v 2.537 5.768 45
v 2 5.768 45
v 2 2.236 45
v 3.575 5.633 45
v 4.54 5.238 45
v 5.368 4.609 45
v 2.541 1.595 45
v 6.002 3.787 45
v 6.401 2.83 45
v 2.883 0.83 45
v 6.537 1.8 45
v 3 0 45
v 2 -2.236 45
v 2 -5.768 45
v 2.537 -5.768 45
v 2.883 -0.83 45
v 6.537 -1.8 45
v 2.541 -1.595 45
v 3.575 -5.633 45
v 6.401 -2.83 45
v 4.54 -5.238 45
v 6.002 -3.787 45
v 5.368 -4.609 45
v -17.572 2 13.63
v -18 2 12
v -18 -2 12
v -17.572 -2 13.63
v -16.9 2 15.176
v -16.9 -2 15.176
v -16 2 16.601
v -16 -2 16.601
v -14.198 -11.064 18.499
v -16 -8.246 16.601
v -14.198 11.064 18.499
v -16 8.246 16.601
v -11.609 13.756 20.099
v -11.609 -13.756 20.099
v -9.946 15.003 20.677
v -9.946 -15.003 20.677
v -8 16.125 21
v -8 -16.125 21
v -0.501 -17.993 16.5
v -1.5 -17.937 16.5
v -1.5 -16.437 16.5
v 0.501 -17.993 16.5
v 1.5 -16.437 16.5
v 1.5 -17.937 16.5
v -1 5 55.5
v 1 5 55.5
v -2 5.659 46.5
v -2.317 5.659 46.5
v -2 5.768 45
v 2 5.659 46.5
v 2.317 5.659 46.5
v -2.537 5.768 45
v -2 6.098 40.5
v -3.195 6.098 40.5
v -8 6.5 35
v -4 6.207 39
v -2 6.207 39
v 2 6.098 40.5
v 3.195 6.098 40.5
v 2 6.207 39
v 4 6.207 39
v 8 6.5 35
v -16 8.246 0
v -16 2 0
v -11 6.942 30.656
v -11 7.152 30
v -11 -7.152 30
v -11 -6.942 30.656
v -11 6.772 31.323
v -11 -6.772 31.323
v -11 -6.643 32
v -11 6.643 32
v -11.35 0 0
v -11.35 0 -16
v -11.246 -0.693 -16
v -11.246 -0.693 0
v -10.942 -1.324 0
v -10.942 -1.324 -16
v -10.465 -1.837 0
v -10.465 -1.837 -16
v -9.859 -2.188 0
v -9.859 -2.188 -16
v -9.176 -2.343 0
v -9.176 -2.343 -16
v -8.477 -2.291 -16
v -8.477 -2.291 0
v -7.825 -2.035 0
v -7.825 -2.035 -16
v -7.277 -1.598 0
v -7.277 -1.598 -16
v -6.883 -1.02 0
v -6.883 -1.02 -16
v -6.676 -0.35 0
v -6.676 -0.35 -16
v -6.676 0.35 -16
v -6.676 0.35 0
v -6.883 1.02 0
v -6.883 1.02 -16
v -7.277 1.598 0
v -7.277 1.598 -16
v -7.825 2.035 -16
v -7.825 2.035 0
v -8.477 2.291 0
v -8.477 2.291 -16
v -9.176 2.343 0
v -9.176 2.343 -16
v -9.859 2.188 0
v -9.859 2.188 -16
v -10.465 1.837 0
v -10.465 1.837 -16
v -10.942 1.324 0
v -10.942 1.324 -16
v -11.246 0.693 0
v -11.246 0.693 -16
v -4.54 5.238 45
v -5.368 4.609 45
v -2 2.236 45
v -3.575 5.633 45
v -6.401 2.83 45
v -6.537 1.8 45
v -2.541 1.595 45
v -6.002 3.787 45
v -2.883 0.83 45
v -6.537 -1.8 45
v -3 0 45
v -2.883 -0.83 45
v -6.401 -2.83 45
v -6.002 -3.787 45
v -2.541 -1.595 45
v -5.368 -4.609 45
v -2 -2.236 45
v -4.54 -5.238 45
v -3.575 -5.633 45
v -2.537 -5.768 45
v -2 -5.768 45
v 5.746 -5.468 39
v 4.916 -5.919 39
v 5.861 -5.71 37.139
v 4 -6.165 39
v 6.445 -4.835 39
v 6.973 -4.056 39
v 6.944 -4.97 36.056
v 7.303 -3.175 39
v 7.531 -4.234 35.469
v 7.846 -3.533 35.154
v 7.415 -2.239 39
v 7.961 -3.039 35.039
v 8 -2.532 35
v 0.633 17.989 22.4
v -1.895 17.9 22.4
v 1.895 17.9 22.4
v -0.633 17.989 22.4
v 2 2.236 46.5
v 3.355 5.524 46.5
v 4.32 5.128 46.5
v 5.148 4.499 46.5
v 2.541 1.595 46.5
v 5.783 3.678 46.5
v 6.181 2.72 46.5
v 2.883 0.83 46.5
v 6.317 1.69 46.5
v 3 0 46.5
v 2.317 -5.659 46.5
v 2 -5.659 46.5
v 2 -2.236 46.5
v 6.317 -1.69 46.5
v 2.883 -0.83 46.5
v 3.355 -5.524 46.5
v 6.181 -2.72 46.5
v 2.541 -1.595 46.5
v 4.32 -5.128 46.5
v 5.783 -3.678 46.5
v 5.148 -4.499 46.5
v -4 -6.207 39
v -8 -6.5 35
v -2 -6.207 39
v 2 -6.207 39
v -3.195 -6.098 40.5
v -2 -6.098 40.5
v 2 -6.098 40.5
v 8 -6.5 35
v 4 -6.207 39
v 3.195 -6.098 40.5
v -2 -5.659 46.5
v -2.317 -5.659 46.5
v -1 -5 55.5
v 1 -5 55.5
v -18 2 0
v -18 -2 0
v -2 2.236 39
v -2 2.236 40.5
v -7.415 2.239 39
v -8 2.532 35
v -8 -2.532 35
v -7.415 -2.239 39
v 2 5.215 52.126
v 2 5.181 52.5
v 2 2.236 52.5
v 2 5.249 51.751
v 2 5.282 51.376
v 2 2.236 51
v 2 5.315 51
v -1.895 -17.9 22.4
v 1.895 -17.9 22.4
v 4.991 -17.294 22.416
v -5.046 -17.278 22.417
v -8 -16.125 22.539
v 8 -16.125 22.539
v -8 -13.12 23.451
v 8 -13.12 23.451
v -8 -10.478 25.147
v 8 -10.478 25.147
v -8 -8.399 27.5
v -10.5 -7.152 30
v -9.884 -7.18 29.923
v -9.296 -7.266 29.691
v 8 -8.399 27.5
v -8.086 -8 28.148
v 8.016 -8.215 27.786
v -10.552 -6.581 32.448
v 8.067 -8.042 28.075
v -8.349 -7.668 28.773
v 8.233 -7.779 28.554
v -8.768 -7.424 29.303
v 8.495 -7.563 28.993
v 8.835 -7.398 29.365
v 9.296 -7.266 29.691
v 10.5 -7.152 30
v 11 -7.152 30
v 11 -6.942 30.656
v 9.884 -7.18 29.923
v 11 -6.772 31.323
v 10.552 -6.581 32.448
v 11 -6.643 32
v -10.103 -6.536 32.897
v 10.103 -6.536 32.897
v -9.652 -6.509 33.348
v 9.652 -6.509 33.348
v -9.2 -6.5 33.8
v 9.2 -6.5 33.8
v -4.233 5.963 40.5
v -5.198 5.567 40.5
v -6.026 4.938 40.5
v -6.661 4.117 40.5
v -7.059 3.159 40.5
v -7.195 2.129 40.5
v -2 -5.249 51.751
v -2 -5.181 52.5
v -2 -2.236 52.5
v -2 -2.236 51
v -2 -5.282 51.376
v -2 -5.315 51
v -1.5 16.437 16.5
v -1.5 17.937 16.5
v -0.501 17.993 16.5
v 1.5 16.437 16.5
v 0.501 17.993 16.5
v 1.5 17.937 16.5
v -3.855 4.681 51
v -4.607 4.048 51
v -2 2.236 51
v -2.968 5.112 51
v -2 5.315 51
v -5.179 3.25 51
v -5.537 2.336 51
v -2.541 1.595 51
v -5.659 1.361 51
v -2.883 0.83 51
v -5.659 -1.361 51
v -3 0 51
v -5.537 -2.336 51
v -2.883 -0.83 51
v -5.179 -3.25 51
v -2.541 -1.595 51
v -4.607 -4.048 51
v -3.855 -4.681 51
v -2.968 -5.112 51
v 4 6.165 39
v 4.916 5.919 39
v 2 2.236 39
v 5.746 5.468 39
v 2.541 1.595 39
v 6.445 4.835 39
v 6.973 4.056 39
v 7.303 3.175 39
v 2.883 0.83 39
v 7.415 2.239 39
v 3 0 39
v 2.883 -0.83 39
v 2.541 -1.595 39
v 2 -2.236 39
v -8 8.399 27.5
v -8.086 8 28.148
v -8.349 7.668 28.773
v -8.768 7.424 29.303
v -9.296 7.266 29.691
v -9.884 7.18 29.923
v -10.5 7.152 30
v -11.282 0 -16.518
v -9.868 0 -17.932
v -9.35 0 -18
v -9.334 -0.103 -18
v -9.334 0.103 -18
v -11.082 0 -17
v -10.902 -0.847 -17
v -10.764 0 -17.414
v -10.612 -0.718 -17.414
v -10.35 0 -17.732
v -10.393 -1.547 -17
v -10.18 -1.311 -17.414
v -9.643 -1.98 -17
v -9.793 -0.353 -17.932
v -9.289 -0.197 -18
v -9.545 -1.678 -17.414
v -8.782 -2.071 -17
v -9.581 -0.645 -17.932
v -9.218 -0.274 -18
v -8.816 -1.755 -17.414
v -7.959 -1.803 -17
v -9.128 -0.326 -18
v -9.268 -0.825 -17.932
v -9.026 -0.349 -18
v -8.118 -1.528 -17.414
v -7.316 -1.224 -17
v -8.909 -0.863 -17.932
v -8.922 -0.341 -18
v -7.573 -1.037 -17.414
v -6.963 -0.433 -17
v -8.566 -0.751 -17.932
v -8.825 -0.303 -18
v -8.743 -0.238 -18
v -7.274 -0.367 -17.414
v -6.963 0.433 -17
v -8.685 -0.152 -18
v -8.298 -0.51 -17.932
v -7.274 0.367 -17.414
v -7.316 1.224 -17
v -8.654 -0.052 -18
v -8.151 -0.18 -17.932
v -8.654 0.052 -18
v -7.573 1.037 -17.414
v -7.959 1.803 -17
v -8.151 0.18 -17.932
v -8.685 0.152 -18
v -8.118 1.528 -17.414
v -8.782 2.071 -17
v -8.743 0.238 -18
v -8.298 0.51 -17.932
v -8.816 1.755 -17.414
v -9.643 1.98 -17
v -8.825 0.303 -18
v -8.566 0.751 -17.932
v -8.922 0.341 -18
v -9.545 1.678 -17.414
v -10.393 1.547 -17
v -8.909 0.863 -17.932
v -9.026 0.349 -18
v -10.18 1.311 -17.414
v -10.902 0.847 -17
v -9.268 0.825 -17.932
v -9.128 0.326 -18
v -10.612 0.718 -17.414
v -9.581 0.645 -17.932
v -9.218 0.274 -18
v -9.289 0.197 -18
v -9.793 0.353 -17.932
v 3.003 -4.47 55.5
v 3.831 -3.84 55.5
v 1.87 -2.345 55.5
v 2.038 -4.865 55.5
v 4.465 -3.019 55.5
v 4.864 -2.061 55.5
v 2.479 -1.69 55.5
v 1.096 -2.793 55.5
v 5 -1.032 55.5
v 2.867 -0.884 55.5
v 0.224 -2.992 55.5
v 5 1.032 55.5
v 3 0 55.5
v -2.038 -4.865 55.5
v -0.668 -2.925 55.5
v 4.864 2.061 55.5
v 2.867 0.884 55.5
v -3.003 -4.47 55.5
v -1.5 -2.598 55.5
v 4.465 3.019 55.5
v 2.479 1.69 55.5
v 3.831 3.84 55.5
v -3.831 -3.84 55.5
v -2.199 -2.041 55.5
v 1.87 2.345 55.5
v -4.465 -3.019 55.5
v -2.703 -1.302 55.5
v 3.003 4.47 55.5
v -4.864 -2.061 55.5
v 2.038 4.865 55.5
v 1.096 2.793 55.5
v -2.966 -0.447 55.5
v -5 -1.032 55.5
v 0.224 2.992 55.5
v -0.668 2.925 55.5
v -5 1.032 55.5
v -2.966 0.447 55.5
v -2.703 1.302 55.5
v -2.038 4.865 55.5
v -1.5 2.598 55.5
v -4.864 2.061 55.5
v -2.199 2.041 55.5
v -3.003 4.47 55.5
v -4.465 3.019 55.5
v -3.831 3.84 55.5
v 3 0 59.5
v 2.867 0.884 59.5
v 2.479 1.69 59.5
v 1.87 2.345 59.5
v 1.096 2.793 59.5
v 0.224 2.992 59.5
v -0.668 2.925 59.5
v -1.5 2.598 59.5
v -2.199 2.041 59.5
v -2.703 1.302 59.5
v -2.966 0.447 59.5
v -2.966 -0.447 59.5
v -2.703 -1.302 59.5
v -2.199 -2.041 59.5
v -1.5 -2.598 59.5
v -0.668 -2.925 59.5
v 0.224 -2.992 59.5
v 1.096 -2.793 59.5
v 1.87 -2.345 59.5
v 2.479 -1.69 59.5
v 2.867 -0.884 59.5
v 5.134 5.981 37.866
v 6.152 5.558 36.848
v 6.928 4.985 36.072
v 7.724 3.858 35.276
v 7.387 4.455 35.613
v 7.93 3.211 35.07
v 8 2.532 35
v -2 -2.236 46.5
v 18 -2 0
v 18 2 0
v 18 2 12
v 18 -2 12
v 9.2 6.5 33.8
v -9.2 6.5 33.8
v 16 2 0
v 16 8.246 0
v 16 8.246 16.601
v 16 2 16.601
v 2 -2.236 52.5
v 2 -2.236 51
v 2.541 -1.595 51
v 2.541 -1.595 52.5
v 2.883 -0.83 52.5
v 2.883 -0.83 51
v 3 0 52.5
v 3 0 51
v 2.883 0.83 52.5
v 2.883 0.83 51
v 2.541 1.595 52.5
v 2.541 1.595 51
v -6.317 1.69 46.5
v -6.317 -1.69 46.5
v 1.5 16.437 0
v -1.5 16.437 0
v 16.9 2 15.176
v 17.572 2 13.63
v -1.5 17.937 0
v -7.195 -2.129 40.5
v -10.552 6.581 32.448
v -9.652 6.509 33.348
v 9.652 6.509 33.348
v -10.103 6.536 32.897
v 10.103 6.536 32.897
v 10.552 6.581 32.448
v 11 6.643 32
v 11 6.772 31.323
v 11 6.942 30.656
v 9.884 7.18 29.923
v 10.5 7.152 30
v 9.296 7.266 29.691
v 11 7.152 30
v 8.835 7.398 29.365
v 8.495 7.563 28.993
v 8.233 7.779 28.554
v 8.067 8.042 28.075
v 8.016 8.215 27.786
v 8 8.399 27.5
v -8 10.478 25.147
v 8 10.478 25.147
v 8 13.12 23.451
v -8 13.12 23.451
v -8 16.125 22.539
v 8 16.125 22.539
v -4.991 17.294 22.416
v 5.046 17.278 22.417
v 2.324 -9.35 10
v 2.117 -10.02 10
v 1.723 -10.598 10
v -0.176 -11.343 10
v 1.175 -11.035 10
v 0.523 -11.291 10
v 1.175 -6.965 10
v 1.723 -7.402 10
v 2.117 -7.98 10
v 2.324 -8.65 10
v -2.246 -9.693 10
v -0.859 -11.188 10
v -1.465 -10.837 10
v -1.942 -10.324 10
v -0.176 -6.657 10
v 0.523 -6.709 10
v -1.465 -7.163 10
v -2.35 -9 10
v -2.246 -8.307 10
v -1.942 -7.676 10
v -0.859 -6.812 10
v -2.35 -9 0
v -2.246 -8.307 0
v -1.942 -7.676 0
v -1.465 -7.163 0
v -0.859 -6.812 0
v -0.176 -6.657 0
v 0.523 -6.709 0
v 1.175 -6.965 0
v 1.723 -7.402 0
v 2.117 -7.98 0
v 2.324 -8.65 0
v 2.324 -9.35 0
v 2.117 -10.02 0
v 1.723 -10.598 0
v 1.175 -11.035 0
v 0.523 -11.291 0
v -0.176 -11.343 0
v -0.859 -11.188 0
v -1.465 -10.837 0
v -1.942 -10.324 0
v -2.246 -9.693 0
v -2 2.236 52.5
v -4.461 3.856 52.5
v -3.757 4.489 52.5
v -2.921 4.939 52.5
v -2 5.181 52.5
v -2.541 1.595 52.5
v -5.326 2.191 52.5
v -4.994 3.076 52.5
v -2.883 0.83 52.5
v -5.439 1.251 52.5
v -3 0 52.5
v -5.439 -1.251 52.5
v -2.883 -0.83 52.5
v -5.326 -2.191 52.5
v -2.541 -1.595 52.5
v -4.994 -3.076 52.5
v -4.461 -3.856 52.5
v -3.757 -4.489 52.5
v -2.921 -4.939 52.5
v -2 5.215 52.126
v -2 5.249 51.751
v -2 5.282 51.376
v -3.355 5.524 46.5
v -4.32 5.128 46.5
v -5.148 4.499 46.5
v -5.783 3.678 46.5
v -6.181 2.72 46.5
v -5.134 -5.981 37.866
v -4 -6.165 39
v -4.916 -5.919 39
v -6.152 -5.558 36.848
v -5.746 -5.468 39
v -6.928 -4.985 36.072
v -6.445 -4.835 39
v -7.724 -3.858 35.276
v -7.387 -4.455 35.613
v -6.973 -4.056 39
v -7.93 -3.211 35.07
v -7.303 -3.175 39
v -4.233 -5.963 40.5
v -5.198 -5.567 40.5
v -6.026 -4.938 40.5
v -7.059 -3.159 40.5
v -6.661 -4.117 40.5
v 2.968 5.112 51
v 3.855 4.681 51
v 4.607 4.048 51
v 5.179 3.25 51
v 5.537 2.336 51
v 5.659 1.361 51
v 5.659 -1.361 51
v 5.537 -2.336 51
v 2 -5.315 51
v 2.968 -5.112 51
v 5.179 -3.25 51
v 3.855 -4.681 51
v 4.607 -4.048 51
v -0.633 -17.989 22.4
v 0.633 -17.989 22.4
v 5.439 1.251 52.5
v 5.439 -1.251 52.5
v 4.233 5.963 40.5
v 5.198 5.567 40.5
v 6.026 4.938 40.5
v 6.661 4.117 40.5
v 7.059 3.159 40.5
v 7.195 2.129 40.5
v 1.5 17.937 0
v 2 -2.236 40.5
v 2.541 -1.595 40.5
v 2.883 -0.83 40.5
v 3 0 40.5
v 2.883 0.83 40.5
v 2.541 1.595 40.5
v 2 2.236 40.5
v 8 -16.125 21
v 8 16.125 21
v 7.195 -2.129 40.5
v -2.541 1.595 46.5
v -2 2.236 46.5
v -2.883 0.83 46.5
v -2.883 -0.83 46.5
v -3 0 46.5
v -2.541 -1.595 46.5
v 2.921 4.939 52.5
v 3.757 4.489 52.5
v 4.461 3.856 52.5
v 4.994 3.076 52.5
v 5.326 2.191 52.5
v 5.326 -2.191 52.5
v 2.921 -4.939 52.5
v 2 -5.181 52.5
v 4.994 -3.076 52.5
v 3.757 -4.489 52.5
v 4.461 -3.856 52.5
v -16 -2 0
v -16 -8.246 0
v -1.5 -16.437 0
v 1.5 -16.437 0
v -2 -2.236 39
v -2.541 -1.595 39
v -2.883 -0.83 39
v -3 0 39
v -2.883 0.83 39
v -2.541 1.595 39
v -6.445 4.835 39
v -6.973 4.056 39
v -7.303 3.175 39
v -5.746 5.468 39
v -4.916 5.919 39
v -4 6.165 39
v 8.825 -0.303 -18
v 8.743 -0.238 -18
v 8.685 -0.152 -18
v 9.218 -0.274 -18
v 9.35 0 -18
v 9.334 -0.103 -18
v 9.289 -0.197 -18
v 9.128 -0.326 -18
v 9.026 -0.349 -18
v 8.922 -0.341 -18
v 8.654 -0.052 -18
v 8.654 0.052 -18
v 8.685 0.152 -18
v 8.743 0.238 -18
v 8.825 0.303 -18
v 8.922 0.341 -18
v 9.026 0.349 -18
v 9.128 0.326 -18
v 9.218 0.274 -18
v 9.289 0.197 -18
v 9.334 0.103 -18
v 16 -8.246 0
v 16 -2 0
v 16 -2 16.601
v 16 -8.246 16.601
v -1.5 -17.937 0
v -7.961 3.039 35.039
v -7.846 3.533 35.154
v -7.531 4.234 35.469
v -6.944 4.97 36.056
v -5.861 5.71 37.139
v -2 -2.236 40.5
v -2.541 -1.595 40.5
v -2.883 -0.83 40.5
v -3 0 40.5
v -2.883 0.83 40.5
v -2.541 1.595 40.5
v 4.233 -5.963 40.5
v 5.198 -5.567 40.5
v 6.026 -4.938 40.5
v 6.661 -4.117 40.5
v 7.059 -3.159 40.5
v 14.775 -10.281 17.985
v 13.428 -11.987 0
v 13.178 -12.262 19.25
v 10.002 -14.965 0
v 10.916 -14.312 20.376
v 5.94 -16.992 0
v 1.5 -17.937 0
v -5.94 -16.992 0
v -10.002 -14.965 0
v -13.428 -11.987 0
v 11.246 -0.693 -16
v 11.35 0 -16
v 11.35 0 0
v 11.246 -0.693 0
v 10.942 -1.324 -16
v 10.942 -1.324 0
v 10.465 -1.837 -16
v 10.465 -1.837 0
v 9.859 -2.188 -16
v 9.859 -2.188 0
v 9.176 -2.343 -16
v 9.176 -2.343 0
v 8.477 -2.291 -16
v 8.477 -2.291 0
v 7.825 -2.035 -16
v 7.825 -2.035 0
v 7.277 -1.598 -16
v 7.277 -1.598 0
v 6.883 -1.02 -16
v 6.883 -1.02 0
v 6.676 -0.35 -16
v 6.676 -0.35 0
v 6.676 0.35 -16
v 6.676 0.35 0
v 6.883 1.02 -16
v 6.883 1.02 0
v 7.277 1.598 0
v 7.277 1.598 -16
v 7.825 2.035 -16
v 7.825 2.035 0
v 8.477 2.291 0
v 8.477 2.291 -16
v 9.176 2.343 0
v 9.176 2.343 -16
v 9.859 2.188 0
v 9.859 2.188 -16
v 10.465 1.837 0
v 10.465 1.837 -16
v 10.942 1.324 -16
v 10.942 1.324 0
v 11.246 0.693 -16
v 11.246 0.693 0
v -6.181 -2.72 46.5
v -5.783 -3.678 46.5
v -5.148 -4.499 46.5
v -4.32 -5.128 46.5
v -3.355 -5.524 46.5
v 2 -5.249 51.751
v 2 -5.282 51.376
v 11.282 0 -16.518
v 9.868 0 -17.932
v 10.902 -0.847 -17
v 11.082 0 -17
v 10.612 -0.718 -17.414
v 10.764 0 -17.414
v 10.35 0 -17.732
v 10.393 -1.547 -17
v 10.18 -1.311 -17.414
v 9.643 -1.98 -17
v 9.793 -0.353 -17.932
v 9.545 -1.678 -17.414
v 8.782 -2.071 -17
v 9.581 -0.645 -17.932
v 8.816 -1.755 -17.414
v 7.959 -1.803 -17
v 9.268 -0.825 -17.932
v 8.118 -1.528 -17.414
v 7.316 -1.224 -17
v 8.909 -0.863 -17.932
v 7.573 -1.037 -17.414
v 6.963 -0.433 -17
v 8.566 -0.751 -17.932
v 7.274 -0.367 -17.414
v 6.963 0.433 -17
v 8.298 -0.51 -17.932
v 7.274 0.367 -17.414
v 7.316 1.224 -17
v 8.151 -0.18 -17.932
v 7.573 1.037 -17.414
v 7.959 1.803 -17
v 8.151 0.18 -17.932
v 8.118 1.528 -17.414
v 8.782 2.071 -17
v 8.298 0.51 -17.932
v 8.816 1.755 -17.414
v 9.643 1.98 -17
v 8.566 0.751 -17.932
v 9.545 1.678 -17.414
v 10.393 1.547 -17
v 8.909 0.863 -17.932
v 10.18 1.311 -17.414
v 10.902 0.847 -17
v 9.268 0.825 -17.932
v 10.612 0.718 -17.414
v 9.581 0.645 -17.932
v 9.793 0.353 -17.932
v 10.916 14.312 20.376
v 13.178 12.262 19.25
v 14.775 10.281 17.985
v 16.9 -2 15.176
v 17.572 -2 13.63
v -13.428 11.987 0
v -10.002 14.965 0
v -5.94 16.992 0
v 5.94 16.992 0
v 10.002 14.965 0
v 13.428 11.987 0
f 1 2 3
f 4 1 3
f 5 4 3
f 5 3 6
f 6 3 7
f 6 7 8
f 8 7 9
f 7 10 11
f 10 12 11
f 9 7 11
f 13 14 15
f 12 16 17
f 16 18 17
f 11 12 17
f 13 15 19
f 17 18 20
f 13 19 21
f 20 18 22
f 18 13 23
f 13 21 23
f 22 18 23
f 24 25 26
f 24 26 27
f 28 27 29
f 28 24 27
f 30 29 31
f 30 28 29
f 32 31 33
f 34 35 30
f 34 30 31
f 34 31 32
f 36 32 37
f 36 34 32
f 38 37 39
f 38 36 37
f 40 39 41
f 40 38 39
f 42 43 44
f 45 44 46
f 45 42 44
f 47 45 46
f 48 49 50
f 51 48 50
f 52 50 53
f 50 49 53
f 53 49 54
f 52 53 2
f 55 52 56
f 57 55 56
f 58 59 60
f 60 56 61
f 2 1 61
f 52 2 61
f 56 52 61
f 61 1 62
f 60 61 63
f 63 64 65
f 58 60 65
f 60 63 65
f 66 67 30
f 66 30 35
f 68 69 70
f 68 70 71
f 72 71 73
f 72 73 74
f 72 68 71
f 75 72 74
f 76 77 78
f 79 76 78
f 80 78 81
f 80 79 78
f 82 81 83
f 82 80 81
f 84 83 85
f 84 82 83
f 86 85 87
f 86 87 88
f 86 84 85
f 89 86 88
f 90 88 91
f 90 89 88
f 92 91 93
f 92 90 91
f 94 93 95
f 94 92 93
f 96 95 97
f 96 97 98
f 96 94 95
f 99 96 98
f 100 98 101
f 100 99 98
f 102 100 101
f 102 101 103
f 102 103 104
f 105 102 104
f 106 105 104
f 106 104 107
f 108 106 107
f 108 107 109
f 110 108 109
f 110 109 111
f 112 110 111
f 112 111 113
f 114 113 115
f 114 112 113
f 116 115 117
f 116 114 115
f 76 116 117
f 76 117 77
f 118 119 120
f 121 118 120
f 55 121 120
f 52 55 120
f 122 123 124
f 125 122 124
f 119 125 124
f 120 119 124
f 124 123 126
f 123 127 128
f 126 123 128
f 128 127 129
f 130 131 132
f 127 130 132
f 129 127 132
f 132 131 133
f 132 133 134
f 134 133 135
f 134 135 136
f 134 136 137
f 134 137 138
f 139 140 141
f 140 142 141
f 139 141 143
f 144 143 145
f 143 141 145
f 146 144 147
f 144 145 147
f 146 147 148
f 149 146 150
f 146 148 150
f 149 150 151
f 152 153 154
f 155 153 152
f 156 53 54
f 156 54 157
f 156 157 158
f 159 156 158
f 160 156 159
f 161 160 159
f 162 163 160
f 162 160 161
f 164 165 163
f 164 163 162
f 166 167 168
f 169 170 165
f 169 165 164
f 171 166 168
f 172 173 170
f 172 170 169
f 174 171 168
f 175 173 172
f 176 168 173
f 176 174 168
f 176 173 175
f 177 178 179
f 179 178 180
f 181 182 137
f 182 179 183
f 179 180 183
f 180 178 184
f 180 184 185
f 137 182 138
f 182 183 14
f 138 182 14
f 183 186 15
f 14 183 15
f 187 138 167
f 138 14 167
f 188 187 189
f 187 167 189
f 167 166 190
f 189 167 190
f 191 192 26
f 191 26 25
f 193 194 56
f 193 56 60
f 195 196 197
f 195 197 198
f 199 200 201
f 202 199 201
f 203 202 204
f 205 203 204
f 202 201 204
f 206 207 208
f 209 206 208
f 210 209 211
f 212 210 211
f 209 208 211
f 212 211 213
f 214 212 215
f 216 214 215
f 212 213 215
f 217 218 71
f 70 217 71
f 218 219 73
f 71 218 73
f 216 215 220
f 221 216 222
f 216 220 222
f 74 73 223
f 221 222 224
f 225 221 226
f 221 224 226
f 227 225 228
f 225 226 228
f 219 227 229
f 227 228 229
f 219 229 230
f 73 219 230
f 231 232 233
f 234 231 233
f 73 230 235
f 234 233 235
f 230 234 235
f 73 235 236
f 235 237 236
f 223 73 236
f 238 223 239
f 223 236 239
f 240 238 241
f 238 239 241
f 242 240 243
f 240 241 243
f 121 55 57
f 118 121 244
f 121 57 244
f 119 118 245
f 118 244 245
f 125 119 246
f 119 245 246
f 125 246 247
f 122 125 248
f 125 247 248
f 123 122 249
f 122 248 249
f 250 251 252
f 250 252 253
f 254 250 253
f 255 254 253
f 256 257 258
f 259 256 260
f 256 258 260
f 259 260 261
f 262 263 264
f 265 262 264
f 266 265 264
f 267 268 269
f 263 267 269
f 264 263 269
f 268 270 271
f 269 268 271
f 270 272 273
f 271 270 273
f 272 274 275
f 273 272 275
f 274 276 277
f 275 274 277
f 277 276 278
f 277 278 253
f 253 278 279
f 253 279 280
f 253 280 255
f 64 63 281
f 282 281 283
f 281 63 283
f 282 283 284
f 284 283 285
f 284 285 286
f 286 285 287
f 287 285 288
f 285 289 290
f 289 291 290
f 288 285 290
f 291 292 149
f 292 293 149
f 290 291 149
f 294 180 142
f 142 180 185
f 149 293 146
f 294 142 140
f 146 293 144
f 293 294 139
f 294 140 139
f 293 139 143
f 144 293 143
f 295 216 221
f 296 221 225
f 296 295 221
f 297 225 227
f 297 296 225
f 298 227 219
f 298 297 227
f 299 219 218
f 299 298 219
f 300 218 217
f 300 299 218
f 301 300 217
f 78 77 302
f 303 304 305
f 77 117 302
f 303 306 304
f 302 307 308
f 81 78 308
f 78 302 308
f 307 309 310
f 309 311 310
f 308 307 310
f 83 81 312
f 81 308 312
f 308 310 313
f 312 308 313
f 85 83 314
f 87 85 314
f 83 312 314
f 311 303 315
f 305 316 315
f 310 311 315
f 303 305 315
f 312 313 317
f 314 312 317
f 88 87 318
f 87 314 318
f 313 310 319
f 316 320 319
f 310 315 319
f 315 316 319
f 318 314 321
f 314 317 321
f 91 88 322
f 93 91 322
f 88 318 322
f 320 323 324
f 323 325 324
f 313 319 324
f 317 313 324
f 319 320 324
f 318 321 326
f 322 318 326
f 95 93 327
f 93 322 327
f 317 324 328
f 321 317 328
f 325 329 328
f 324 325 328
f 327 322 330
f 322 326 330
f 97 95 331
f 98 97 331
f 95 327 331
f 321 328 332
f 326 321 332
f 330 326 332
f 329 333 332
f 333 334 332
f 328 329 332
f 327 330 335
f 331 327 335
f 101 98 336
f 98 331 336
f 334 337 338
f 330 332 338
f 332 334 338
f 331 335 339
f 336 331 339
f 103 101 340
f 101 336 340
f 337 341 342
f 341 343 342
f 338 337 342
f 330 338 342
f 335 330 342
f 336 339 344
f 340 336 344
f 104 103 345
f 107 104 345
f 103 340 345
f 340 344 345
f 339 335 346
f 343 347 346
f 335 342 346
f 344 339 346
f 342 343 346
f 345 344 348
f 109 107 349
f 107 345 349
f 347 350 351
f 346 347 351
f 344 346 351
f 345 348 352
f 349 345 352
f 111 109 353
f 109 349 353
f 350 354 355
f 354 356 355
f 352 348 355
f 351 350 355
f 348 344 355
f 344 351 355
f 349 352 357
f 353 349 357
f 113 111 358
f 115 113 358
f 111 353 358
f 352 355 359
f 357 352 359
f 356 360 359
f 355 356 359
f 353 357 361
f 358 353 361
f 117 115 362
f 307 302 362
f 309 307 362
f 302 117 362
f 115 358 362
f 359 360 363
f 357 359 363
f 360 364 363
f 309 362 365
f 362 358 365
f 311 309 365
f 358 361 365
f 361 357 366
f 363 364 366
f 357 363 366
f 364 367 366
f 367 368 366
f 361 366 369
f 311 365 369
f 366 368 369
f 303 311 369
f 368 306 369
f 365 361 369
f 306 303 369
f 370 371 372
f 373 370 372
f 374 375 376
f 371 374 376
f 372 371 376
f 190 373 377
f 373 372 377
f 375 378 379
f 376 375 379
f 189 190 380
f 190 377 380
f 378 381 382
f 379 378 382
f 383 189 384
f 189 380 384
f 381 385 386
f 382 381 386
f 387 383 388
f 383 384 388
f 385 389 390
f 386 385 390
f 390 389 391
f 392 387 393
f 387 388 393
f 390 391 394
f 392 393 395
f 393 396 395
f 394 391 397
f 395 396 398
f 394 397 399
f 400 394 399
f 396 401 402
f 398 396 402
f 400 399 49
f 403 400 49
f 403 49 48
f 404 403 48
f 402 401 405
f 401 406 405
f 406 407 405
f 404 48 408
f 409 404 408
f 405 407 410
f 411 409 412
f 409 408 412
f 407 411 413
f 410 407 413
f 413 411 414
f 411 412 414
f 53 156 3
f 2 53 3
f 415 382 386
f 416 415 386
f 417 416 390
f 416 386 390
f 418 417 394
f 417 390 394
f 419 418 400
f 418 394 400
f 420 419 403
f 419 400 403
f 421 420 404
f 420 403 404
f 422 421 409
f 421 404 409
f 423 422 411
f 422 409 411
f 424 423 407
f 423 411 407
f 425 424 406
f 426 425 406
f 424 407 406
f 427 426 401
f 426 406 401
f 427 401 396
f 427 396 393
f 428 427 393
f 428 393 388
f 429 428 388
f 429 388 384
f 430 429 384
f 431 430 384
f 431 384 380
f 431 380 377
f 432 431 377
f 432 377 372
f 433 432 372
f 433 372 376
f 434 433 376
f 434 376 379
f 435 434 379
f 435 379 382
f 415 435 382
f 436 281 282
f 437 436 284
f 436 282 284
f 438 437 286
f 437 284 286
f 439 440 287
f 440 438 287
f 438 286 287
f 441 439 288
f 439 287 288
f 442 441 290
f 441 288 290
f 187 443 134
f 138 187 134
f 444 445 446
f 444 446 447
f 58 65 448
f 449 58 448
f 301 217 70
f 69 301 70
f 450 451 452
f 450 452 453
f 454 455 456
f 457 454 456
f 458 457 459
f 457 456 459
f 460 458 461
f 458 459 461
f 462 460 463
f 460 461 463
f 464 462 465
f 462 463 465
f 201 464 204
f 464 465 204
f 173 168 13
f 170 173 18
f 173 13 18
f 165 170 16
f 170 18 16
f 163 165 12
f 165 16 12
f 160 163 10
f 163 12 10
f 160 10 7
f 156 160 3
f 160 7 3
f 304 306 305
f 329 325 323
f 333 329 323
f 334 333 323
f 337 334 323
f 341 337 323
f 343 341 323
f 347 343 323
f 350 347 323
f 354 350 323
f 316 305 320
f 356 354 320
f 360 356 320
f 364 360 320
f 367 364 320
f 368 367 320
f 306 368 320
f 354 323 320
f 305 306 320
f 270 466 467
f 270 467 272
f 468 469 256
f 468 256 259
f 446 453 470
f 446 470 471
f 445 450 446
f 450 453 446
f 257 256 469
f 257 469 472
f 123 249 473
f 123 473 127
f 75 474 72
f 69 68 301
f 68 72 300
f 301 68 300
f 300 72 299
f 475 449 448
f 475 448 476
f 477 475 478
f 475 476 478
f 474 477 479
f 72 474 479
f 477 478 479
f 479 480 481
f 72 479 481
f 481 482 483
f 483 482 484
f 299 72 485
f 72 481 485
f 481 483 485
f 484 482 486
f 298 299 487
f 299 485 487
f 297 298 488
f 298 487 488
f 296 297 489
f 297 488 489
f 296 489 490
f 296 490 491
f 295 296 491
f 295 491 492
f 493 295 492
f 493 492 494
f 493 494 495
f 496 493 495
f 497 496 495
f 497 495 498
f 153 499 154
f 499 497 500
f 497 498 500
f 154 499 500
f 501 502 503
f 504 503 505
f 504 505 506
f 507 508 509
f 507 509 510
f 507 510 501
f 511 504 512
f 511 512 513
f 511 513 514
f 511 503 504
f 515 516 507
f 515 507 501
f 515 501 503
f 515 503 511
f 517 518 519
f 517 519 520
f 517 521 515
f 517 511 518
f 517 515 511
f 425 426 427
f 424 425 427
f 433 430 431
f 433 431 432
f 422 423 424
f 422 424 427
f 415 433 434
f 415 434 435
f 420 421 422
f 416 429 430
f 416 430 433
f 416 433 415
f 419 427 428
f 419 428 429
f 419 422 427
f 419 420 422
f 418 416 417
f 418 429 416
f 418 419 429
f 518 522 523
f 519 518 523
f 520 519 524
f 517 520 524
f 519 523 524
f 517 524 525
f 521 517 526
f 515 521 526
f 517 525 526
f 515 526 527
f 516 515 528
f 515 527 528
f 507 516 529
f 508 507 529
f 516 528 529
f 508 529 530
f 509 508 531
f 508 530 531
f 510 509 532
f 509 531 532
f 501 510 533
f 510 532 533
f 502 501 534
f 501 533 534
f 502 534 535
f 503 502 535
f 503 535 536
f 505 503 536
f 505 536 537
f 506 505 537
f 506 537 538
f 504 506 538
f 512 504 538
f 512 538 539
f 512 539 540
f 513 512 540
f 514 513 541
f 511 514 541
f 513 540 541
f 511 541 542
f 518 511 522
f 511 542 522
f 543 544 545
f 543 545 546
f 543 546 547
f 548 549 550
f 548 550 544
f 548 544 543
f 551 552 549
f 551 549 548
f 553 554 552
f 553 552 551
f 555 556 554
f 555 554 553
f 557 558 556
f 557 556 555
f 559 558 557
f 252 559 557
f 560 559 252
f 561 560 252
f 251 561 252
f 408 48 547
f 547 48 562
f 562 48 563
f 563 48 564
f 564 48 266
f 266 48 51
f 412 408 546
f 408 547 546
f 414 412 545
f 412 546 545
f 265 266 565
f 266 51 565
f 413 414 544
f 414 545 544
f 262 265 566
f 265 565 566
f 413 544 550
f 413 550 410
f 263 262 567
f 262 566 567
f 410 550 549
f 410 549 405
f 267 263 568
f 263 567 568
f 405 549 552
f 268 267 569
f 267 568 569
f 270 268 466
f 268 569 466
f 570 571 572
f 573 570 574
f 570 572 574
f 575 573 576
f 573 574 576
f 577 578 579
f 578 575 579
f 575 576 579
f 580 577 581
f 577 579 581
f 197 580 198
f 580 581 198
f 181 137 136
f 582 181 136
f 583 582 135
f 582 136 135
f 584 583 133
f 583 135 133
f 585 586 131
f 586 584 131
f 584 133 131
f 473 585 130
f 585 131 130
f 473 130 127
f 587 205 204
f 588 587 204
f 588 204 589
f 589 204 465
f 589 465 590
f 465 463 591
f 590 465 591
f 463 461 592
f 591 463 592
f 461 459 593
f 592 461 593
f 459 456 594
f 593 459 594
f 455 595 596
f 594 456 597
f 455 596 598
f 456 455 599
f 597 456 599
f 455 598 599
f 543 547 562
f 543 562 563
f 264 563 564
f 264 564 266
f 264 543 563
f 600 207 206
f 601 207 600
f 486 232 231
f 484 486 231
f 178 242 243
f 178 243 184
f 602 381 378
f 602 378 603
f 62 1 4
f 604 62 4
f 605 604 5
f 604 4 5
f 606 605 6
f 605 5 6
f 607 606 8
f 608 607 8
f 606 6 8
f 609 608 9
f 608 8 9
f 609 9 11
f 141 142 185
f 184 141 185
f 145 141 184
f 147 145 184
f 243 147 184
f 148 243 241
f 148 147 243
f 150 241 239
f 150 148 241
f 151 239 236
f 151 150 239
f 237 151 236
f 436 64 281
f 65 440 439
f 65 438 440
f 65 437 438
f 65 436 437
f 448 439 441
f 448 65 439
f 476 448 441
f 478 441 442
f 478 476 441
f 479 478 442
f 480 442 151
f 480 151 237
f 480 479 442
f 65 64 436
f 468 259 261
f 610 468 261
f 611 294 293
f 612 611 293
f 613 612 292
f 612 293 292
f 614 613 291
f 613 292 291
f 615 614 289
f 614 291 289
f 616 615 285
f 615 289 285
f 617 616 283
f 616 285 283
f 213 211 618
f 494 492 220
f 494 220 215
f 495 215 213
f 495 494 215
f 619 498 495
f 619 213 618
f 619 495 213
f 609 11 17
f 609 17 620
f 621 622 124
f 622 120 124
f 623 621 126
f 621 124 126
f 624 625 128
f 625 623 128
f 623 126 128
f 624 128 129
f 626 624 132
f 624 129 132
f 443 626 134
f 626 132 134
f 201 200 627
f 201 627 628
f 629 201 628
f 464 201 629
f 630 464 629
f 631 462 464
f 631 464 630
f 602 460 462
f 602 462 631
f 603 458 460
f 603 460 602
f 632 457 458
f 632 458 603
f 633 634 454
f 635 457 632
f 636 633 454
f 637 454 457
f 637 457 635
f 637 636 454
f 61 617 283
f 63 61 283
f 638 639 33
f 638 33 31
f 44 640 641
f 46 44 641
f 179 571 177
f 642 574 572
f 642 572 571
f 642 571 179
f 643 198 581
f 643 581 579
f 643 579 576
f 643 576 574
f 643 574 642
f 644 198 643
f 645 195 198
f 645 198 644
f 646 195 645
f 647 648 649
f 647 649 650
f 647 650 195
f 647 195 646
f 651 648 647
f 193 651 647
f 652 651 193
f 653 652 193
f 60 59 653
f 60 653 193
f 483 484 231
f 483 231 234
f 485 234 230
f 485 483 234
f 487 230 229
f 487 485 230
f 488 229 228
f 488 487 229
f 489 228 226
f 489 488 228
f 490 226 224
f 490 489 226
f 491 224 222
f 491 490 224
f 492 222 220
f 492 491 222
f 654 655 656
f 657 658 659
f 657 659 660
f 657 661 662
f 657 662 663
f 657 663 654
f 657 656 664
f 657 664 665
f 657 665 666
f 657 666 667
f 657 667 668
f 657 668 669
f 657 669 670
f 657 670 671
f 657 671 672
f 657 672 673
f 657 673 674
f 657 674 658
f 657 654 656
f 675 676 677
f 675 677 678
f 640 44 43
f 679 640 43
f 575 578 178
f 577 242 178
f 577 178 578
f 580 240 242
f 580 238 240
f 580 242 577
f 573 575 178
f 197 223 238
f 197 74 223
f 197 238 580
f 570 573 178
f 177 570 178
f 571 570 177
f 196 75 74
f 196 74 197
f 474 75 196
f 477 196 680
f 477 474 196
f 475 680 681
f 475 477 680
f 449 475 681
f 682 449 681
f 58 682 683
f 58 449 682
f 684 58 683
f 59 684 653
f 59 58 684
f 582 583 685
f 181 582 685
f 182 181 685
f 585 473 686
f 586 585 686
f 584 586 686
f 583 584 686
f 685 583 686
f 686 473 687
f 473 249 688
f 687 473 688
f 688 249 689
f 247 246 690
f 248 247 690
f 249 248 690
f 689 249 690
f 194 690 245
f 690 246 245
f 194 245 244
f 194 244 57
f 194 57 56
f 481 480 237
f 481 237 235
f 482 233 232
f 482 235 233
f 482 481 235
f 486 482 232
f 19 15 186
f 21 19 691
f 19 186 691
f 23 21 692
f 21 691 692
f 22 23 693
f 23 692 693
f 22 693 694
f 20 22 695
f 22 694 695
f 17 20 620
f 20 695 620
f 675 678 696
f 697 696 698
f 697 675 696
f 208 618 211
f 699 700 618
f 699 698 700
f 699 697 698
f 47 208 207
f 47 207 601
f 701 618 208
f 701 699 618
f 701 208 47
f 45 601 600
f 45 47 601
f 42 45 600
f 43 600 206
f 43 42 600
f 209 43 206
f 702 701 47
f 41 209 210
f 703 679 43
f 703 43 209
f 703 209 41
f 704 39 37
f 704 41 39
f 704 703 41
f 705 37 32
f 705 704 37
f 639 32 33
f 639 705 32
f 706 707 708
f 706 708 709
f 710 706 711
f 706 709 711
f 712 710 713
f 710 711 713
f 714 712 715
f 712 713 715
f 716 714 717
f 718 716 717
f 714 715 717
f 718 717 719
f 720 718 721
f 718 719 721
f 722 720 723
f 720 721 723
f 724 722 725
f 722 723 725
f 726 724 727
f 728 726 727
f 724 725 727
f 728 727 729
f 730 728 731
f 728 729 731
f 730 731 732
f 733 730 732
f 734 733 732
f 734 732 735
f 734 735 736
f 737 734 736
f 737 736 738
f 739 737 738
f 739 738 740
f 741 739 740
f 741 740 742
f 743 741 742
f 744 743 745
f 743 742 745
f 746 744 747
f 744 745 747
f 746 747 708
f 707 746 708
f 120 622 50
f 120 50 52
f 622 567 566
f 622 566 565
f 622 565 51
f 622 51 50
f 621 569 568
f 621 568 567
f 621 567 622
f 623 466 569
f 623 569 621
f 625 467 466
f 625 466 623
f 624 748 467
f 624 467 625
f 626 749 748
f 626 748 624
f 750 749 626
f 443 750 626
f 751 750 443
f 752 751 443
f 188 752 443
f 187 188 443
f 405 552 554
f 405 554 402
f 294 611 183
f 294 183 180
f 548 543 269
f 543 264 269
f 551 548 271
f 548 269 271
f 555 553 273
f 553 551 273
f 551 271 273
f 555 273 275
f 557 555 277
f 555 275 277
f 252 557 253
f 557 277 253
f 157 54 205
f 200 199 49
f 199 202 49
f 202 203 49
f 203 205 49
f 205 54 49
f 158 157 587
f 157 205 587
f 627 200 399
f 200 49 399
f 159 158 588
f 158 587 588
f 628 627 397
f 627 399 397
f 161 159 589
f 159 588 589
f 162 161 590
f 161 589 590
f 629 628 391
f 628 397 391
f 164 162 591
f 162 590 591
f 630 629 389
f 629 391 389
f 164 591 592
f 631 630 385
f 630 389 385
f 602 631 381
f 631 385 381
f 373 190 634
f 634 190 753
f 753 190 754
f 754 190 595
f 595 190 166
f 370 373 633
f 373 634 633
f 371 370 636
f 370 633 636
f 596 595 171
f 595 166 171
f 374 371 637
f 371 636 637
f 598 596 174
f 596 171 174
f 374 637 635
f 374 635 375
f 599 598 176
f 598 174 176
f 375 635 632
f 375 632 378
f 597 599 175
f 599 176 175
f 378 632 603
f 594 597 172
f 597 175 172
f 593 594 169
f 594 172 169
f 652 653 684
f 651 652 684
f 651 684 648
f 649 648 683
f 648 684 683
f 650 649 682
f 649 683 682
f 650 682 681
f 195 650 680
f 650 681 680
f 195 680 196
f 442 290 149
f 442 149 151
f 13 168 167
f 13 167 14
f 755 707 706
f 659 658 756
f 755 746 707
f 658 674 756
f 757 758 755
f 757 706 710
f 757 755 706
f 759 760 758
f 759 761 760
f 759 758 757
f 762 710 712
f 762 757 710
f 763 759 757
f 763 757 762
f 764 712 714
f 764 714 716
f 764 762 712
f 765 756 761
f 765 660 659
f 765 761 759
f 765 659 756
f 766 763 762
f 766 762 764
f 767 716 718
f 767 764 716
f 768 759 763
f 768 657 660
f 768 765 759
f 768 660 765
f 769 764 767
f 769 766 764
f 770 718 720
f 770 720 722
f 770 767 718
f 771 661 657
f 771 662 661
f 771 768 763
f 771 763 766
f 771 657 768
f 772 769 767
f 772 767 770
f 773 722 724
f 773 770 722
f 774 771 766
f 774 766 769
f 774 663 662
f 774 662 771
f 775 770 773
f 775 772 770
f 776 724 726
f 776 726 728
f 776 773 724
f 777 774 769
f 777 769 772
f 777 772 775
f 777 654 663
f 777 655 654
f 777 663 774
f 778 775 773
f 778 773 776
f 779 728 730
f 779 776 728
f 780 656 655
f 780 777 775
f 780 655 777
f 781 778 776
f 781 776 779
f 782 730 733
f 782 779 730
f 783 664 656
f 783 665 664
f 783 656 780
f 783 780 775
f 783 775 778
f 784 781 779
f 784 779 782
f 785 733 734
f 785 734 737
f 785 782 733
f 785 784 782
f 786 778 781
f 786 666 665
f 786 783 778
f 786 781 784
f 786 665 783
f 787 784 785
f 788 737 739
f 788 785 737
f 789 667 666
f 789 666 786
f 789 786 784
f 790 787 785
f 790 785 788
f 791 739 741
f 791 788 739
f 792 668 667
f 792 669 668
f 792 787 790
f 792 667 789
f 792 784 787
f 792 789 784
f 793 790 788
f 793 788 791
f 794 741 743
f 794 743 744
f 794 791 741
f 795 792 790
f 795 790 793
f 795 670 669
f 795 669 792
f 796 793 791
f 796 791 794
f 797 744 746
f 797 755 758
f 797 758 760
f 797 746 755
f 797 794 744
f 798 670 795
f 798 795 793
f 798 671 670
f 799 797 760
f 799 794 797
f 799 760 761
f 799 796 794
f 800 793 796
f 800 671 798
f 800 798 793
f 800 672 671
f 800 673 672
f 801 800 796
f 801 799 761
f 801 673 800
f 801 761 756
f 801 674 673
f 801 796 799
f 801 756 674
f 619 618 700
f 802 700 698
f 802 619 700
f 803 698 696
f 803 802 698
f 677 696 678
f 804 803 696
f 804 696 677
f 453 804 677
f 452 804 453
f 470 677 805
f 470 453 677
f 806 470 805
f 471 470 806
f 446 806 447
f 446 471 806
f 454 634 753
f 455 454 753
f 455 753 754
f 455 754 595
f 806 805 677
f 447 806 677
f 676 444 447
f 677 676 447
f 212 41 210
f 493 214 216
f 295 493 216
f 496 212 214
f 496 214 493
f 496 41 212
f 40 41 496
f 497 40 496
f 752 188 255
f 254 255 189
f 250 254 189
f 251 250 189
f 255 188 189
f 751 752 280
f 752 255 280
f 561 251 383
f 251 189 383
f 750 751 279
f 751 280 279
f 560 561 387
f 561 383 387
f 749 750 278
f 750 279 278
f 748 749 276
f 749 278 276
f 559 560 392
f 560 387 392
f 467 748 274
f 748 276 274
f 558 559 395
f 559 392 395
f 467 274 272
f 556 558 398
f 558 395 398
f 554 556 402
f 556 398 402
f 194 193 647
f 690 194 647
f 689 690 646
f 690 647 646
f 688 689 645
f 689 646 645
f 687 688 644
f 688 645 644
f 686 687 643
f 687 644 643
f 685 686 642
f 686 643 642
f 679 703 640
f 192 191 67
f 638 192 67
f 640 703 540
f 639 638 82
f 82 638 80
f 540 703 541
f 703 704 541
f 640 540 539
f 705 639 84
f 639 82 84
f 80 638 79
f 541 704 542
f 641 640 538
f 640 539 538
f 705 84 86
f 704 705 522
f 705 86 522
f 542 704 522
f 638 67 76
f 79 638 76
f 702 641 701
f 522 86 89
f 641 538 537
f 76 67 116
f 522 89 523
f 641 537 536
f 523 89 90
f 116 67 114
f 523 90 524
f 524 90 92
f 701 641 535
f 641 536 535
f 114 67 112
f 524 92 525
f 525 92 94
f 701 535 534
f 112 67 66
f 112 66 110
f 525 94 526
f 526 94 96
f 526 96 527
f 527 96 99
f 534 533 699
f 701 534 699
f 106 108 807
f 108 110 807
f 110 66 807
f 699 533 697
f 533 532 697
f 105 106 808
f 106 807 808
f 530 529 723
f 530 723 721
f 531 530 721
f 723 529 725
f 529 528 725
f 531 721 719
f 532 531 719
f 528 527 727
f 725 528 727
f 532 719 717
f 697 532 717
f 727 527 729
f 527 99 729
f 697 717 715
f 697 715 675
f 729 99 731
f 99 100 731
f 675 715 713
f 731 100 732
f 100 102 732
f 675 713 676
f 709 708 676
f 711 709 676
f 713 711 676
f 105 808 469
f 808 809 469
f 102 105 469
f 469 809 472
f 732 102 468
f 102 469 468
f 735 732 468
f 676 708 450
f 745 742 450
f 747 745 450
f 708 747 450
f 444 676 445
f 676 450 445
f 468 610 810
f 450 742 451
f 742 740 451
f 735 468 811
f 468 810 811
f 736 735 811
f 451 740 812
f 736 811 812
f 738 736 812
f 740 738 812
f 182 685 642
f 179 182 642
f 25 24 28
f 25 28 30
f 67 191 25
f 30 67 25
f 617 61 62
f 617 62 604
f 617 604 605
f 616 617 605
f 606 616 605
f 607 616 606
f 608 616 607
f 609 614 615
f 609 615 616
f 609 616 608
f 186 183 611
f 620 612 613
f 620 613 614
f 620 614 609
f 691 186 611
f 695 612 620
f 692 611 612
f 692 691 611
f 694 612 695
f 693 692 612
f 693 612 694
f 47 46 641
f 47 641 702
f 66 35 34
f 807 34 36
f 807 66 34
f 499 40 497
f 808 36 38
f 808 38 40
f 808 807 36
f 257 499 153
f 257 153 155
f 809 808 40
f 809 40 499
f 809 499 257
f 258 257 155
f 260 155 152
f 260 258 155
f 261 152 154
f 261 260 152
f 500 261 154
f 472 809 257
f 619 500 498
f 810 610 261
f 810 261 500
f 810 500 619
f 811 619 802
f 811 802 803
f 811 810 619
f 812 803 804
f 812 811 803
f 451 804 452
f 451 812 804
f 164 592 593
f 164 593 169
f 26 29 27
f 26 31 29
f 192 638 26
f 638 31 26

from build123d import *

# Parameters (mm, degrees)
BOSS_EXTRUDE1_DEPTH  = 55.5
SKETCH4_OUTSIDE_W    = 53.062
SKETCH4_OUTSIDE_H    = 72.562
CUT_EXTRUDE3_DEPTH   = 20
CUT_EXTRUDE4_DEPTH   = 16.5
SKETCH6_R            = 5
BOSS_EXTRUDE3_DEPTH  = 55.5
SKETCH7_OUTSIDE_W    = 72.562
SKETCH7_OUTSIDE_H    = 53.062
CUT_EXTRUDE6_DEPTH   = 27.75
FILLET3_R            = 4
SKETCH8_R            = 2.35
BOSS_EXTRUDE4_DEPTH  = 18
FILLET4_R            = 2
FILLET4_OF_MIRROR2_R = 2
SKETCH10_W           = 8.464758564
SKETCH10_H           = 1.5
CUT_EXTRUDE8_DEPTH   = 12
SKETCH11_R           = 3
BOSS_EXTRUDE6_DEPTH  = 59.5
SKETCH12_R           = 2.35
CUT_EXTRUDE9_DEPTH   = 10


with BuildPart() as part:
    # Sketch1 → Boss-Extrude1 (new body)
    with BuildSketch(Plane.XY):
        with BuildLine():
            Line((-16, 2), (-16, 8.246211251))
            ThreePointArc((-16, 8.246211251), (0, 18), (16, 8.246211251))
            Line((16, 8.246211251), (16, 2))
            Line((16, 2), (18, 2))
            Line((18, 2), (18, -2))
            Line((18, -2), (16, -2))
            Line((16, -2), (16, -8.246211251))
            ThreePointArc((16, -8.246211251), (0, -18), (-16, -8.246211251))
            Line((-16, -8.246211251), (-16, -2))
            Line((-16, -2), (-18, -2))
            Line((-18, -2), (-18, 2))
            Line((-18, 2), (-16, 2))
        make_face()
    extrude(amount=BOSS_EXTRUDE1_DEPTH)

    # Sketch4 outside → Cut-Extrude3 (cut, symmetric)
    with BuildSketch(Plane(origin=(0, 0, 0), x_dir=(1, 0, 0), z_dir=(0, 1, 0))):
        with Locations((0, -27.75)):
            Rectangle(SKETCH4_OUTSIDE_W, SKETCH4_OUTSIDE_H)
        with BuildLine():
            Line((-18, 0), (-18, -12))
            ThreePointArc((-18, -12), (-14.536312565, -18.207013961), (-8, -21))
            Line((-8, -21), (-8, -27.5))
            ThreePointArc((-8, -27.5), (-8.732233047, -29.267766953), (-10.5, -30))
            Line((-10.5, -30), (-11, -30))
            Line((-11, -30), (-11, -32))
            Line((-11, -32), (-8, -35))
            Line((-8, -35), (-5, -55.5))
            Line((-5, -55.5), (5, -55.5))
            Line((5, -55.5), (8, -35))
            Line((8, -35), (11, -32))
            Line((11, -32), (11, -30))
            Line((11, -30), (10.5, -30))
            ThreePointArc((10.5, -30), (8.732233047, -29.267766953), (8, -27.5))
            Line((8, -27.5), (8, -21))
            ThreePointArc((8, -21), (14.536312565, -18.207013961), (18, -12))
            Line((18, -12), (18, 0))
            Line((18, 0), (-18, 0))
        make_face(mode=Mode.SUBTRACT)
    extrude(amount=CUT_EXTRUDE3_DEPTH, both=True, mode=Mode.SUBTRACT)

    # Sketch5 → Cut-Extrude4 (cut)
    with BuildSketch(Plane(origin=(0, 0, 0), x_dir=(-1, 0, 0), z_dir=(0, 0, -1))):
        Polygon((0, 19.680001022), (1.5, 19.680001022), (1.5, 17.937391115), (1.5, 16.437391115), (-1.5, 16.437391115), (-1.5, 19.680001022), align=None)
    cut_extrude4 = extrude(amount=-CUT_EXTRUDE4_DEPTH, mode=Mode.SUBTRACT)

    # Mirror1: Cut-Extrude4 across plane
    add(cut_extrude4.mirror(Plane.ZX), mode=Mode.SUBTRACT)

    # Sketch6 → Boss-Extrude3 (add)
    with BuildSketch(Plane.XY):
        Circle(SKETCH6_R)
    extrude(amount=BOSS_EXTRUDE3_DEPTH)

    # Sketch7 outside → Cut-Extrude6 (cut, symmetric)
    with BuildSketch(Plane(origin=(0, 0, 0), x_dir=(0, 0, -1), z_dir=(1, 0, 0))):
        with Locations((-27.75, 0)):
            Rectangle(SKETCH7_OUTSIDE_W, SKETCH7_OUTSIDE_H)
        with BuildLine():
            Line((-22.4, 17.937391115), (-22.4, 20.910001086))
            Line((-22.4, 20.910001086), (0, 20.910001086))
            Line((0, 20.910001086), (0, 17.937391115))
            Line((0, 17.937391115), (0, -17.937391115))
            Line((0, -17.937391115), (0, -20.333967998))
            Line((0, -20.333967998), (-22.4, -20.333967998))
            Line((-22.4, -20.333967998), (-22.4, -17.9))
            ThreePointArc((-22.4, -17.9), (-25.738982694, -9.838982694), (-33.8, -6.5))
            Line((-33.8, -6.5), (-35, -6.5))
            Line((-35, -6.5), (-55.5, -5))
            Line((-55.5, -5), (-55.5, 5))
            Line((-55.5, 5), (-35, 6.5))
            Line((-35, 6.5), (-33.8, 6.5))
            ThreePointArc((-33.8, 6.5), (-25.738982694, 9.838982694), (-22.4, 17.9))
            Line((-22.4, 17.9), (-22.4, 17.937391115))
        make_face(mode=Mode.SUBTRACT)
    extrude(amount=CUT_EXTRUDE6_DEPTH, both=True, mode=Mode.SUBTRACT)

    # Fillet3
    # the kernel refuses this fillet: 4 mm, written as the material it takes off along each edge
    with BuildSketch(Plane(origin=(3.570969245, 4.285484623, 65.26504349), x_dir=(0.010456033399530511, -0.9973894081641158, -0.0714495615632633), z_dir=(0.14442116856011564, 0.07221058427983153, -0.9868779851580924))) as fillet3_piece_1_section:
        with BuildLine():
            CenterArc((FILLET3_R * 0.989488430862, FILLET3_R), FILLET3_R, 180.605445032, 89.394554968)
            Line((-FILLET3_R * 0.0104557388149, FILLET3_R * 0.989433187404), (0, 0))
            Line((0, 0), (FILLET3_R * 0.989488430862, 0))
        make_face()
    fillet3_piece_1 = extrude(amount=40.562346695, mode=Mode.PRIVATE)
    fillet3_piece_1 = split(fillet3_piece_1, bisect_by=Plane(origin=(-1.347793771, 4.447005001, 44.347793771), z_dir=(0.7071067811865519, 0, 0.7071067811865431)), keep=Keep.TOP, mode=Mode.PRIVATE)
    add(fillet3_piece_1, mode=Mode.SUBTRACT)
    with BuildSketch(Plane(origin=(9.429030755, -7.214515377, 25.23495651), x_dir=(0.01045603339953013, 0.9973894081641159, -0.07144956156326311), z_dir=(-0.14442116856011564, 0.07221058427983126, 0.9868779851580924))) as fillet3_piece_2_section:
        with BuildLine():
            CenterArc((FILLET3_R * 0.989488430862, FILLET3_R), FILLET3_R, 180.605445032, 89.394554968)
            Line((-FILLET3_R * 0.0104557388149, FILLET3_R * 0.989433187404), (0, 0))
            Line((0, 0), (FILLET3_R * 0.989488430862, 0))
        make_face()
    fillet3_piece_2 = extrude(amount=40.562346695, mode=Mode.PRIVATE)
    fillet3_piece_2 = split(fillet3_piece_2, bisect_by=Plane(origin=(-1.347793771, -4.447005001, 44.347793771), z_dir=(0.7071067811865519, 0, 0.7071067811865431)), keep=Keep.TOP, mode=Mode.PRIVATE)
    add(fillet3_piece_2, mode=Mode.SUBTRACT)
    with BuildSketch(Plane(origin=(-9.429030755, 7.214515377, 25.23495651), x_dir=(-0.010456033399530862, -0.9973894081641158, -0.07144956156326325), z_dir=(0.14442116856011541, -0.07221058427983153, 0.9868779851580924))) as fillet3_piece_3_section:
        with BuildLine():
            CenterArc((FILLET3_R * 0.989488430862, FILLET3_R), FILLET3_R, 180.605445032, 89.394554968)
            Line((-FILLET3_R * 0.0104557388149, FILLET3_R * 0.989433187404), (0, 0))
            Line((0, 0), (FILLET3_R * 0.989488430862, 0))
        make_face()
    fillet3_piece_3 = extrude(amount=40.562346695, mode=Mode.PRIVATE)
    fillet3_piece_3 = split(fillet3_piece_3, bisect_by=Plane(origin=(1.347793771, 4.447005001, 44.347793771), z_dir=(-0.7071067811865516, 0, 0.7071067811865436)), keep=Keep.TOP, mode=Mode.PRIVATE)
    add(fillet3_piece_3, mode=Mode.SUBTRACT)
    with BuildSketch(Plane(origin=(-3.570969245, -4.285484623, 65.26504349), x_dir=(0.9895163091489351, -0.010539226961374241, -0.1440361018055054), z_dir=(-0.14442116856011541, -0.07221058427983126, -0.9868779851580924))) as fillet3_piece_4_section:
        with BuildLine():
            CenterArc((FILLET3_R * 0.989488430862, -FILLET3_R), FILLET3_R, 90, 89.394554968)
            Line((-FILLET3_R * 0.0104557388149, -FILLET3_R * 0.989433187404), (0, 0))
            Line((0, 0), (FILLET3_R * 0.989488430862, 0))
        make_face()
    fillet3_piece_4 = extrude(amount=40.562346695, mode=Mode.PRIVATE)
    fillet3_piece_4 = split(fillet3_piece_4, bisect_by=Plane(origin=(1.347793771, -4.447005001, 44.347793771), z_dir=(-0.7071067811865516, 0, 0.7071067811865436)), keep=Keep.TOP, mode=Mode.PRIVATE)
    add(fillet3_piece_4, mode=Mode.SUBTRACT)

    # Sketch8 → Boss-Extrude4 (add)
    with BuildSketch(Plane(origin=(0, 0, 0), x_dir=(-1, 0, 0), z_dir=(0, 0, -1))):
        with Locations(Location((-9, 0, 0), (0, 0, 180))):
            Circle(SKETCH8_R)
    boss_extrude4 = extrude(amount=BOSS_EXTRUDE4_DEPTH)

    # Fillet4
    fillet4_edges = [part.edges().sort_by_distance(p)[0] for p in [
        (6.65, 0, -18),
    ]]
    fillet(fillet4_edges, radius=FILLET4_R)

    # Mirror2: Boss-Extrude4 across plane
    add(boss_extrude4.mirror(Plane(origin=(0, 0, 0), x_dir=(0, 0, 1), z_dir=(1, 0, 0))))

    # Fillet4 of Mirror2
    fillet4_of_mirror2_edges = [part.edges().sort_by_distance(p)[0] for p in [
        (-6.65, 0, -18),
    ]]
    fillet(fillet4_of_mirror2_edges, radius=FILLET4_OF_MIRROR2_R)

    # Sketch10 → Cut-Extrude8 (cut, symmetric)
    with BuildSketch(Plane(origin=(0, 0, 0), x_dir=(1, 0, 0), z_dir=(0, 1, 0))):
        with Locations((6.232463803, -39.75)):
            Rectangle(SKETCH10_W, SKETCH10_H)
        with Locations((6.232463803, -45.75)):
            Rectangle(SKETCH10_W, SKETCH10_H)
        with Locations((6.232463803, -51.75)):
            Rectangle(SKETCH10_W, SKETCH10_H)
        with Locations((-6.232463803, -51.75)):
            Rectangle(SKETCH10_W, SKETCH10_H)
        with Locations((-6.232463803, -45.75)):
            Rectangle(SKETCH10_W, SKETCH10_H)
        with Locations((-6.232463803, -39.75)):
            Rectangle(SKETCH10_W, SKETCH10_H)
    extrude(amount=CUT_EXTRUDE8_DEPTH, both=True, mode=Mode.SUBTRACT)

    # Sketch11 → Boss-Extrude6 (add)
    with BuildSketch(Plane.XY):
        Circle(SKETCH11_R)
    extrude(amount=BOSS_EXTRUDE6_DEPTH)

    # Sketch12 → Cut-Extrude9 (cut)
    with BuildSketch(Plane(origin=(0, 0, 0), x_dir=(-1, 0, 0), z_dir=(0, 0, -1))):
        with Locations((0, -9)):
            Circle(SKETCH12_R)
    extrude(amount=-CUT_EXTRUDE9_DEPTH, mode=Mode.SUBTRACT)


solid = part.part
